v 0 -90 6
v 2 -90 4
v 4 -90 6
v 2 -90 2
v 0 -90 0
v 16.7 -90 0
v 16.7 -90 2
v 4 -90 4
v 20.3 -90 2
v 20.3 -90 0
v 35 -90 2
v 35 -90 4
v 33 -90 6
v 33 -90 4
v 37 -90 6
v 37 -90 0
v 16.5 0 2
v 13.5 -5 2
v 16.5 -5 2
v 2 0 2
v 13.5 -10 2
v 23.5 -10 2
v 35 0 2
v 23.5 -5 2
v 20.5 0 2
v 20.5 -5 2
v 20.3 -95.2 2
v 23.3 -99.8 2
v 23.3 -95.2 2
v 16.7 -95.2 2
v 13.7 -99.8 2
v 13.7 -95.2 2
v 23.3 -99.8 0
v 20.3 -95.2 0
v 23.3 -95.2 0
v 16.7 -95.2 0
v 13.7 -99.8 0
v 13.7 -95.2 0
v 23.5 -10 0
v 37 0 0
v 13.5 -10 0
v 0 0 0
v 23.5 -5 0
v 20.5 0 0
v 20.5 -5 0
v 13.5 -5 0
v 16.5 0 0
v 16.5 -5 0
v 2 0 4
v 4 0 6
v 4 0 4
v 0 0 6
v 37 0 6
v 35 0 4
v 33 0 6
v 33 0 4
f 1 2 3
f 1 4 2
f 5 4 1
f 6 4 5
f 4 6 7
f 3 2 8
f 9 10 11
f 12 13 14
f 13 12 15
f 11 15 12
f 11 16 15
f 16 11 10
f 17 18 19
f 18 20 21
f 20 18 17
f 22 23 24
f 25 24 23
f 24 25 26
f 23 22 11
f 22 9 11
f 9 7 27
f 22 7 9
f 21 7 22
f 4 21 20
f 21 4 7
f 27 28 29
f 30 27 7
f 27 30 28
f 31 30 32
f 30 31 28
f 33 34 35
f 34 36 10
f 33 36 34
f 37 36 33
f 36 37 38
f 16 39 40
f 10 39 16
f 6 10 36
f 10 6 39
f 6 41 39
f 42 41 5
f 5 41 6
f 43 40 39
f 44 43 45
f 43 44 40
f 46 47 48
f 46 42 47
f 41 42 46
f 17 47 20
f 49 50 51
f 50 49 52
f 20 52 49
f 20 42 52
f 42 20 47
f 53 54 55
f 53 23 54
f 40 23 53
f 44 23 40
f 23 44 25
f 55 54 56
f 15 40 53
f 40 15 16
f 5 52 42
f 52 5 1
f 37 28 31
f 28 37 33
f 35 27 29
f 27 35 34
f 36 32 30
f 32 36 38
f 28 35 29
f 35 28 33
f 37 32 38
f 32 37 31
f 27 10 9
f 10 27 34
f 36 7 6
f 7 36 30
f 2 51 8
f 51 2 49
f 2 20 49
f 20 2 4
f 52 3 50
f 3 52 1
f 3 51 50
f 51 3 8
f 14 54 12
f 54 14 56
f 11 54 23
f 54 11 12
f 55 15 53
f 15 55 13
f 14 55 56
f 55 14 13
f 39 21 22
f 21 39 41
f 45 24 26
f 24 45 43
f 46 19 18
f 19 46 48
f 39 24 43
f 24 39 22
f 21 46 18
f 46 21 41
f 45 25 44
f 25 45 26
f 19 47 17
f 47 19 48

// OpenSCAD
//FootedPezStand
//Display stands for Pez Collectors
//By Dataman, Charley Jones PMP
//First Version 1.0 6/16/17
// Version 2.0 6/17 add length param
// Design: Break off extended key if not needed
// k                     k
// e shaft  BASE  shaft  e
// y                     y
// riser to catch pez feet

LengthAdjust=0; // 99.8mm undadjusted, - shorten, + lengthen
// LengthAdjust
// When LengthAdjust=0 total is 99.8mm
// Form smaller, go -, ie: -10, would allow for 5layer brim on smaller factor
// For larger, go +, ie: +130, for 10" machines.

rotate([0,0,-90])
difference(){
union(){

//base
cube([90+LengthAdjust,37,2]);

/* For alignment purposes
//key cutout
translate([95+LengthAdjust,13.5,0])
 #cube([5,10,2]);

//shaft cutout
translate([90+LengthAdjust,16.5,0])
 #cube([5,4,2]);
*/    
    
// key    
translate([95.2+LengthAdjust,13.7,0])
 cube([4.6,9.6,2]);

//shaft
translate([89.8+LengthAdjust,16.7,0])
 cube([5.4,3.6,2]);

//front riser    
translate([0,0,2])
 cube([90+LengthAdjust,2,2]);
translate([0,0,4])
 cube([90+LengthAdjust,4,2]);
//back riser
translate([0,35,2])
 cube([90+LengthAdjust,2,2]);
translate([0,33,4])
 cube([90+LengthAdjust,4,2]);
    
    
}
//key cutout
translate([5,13.5,0])
 cube([5,10,2]);

//shaft cutout
translate([0,16.5,0])
 cube([5,4,2]);
}
